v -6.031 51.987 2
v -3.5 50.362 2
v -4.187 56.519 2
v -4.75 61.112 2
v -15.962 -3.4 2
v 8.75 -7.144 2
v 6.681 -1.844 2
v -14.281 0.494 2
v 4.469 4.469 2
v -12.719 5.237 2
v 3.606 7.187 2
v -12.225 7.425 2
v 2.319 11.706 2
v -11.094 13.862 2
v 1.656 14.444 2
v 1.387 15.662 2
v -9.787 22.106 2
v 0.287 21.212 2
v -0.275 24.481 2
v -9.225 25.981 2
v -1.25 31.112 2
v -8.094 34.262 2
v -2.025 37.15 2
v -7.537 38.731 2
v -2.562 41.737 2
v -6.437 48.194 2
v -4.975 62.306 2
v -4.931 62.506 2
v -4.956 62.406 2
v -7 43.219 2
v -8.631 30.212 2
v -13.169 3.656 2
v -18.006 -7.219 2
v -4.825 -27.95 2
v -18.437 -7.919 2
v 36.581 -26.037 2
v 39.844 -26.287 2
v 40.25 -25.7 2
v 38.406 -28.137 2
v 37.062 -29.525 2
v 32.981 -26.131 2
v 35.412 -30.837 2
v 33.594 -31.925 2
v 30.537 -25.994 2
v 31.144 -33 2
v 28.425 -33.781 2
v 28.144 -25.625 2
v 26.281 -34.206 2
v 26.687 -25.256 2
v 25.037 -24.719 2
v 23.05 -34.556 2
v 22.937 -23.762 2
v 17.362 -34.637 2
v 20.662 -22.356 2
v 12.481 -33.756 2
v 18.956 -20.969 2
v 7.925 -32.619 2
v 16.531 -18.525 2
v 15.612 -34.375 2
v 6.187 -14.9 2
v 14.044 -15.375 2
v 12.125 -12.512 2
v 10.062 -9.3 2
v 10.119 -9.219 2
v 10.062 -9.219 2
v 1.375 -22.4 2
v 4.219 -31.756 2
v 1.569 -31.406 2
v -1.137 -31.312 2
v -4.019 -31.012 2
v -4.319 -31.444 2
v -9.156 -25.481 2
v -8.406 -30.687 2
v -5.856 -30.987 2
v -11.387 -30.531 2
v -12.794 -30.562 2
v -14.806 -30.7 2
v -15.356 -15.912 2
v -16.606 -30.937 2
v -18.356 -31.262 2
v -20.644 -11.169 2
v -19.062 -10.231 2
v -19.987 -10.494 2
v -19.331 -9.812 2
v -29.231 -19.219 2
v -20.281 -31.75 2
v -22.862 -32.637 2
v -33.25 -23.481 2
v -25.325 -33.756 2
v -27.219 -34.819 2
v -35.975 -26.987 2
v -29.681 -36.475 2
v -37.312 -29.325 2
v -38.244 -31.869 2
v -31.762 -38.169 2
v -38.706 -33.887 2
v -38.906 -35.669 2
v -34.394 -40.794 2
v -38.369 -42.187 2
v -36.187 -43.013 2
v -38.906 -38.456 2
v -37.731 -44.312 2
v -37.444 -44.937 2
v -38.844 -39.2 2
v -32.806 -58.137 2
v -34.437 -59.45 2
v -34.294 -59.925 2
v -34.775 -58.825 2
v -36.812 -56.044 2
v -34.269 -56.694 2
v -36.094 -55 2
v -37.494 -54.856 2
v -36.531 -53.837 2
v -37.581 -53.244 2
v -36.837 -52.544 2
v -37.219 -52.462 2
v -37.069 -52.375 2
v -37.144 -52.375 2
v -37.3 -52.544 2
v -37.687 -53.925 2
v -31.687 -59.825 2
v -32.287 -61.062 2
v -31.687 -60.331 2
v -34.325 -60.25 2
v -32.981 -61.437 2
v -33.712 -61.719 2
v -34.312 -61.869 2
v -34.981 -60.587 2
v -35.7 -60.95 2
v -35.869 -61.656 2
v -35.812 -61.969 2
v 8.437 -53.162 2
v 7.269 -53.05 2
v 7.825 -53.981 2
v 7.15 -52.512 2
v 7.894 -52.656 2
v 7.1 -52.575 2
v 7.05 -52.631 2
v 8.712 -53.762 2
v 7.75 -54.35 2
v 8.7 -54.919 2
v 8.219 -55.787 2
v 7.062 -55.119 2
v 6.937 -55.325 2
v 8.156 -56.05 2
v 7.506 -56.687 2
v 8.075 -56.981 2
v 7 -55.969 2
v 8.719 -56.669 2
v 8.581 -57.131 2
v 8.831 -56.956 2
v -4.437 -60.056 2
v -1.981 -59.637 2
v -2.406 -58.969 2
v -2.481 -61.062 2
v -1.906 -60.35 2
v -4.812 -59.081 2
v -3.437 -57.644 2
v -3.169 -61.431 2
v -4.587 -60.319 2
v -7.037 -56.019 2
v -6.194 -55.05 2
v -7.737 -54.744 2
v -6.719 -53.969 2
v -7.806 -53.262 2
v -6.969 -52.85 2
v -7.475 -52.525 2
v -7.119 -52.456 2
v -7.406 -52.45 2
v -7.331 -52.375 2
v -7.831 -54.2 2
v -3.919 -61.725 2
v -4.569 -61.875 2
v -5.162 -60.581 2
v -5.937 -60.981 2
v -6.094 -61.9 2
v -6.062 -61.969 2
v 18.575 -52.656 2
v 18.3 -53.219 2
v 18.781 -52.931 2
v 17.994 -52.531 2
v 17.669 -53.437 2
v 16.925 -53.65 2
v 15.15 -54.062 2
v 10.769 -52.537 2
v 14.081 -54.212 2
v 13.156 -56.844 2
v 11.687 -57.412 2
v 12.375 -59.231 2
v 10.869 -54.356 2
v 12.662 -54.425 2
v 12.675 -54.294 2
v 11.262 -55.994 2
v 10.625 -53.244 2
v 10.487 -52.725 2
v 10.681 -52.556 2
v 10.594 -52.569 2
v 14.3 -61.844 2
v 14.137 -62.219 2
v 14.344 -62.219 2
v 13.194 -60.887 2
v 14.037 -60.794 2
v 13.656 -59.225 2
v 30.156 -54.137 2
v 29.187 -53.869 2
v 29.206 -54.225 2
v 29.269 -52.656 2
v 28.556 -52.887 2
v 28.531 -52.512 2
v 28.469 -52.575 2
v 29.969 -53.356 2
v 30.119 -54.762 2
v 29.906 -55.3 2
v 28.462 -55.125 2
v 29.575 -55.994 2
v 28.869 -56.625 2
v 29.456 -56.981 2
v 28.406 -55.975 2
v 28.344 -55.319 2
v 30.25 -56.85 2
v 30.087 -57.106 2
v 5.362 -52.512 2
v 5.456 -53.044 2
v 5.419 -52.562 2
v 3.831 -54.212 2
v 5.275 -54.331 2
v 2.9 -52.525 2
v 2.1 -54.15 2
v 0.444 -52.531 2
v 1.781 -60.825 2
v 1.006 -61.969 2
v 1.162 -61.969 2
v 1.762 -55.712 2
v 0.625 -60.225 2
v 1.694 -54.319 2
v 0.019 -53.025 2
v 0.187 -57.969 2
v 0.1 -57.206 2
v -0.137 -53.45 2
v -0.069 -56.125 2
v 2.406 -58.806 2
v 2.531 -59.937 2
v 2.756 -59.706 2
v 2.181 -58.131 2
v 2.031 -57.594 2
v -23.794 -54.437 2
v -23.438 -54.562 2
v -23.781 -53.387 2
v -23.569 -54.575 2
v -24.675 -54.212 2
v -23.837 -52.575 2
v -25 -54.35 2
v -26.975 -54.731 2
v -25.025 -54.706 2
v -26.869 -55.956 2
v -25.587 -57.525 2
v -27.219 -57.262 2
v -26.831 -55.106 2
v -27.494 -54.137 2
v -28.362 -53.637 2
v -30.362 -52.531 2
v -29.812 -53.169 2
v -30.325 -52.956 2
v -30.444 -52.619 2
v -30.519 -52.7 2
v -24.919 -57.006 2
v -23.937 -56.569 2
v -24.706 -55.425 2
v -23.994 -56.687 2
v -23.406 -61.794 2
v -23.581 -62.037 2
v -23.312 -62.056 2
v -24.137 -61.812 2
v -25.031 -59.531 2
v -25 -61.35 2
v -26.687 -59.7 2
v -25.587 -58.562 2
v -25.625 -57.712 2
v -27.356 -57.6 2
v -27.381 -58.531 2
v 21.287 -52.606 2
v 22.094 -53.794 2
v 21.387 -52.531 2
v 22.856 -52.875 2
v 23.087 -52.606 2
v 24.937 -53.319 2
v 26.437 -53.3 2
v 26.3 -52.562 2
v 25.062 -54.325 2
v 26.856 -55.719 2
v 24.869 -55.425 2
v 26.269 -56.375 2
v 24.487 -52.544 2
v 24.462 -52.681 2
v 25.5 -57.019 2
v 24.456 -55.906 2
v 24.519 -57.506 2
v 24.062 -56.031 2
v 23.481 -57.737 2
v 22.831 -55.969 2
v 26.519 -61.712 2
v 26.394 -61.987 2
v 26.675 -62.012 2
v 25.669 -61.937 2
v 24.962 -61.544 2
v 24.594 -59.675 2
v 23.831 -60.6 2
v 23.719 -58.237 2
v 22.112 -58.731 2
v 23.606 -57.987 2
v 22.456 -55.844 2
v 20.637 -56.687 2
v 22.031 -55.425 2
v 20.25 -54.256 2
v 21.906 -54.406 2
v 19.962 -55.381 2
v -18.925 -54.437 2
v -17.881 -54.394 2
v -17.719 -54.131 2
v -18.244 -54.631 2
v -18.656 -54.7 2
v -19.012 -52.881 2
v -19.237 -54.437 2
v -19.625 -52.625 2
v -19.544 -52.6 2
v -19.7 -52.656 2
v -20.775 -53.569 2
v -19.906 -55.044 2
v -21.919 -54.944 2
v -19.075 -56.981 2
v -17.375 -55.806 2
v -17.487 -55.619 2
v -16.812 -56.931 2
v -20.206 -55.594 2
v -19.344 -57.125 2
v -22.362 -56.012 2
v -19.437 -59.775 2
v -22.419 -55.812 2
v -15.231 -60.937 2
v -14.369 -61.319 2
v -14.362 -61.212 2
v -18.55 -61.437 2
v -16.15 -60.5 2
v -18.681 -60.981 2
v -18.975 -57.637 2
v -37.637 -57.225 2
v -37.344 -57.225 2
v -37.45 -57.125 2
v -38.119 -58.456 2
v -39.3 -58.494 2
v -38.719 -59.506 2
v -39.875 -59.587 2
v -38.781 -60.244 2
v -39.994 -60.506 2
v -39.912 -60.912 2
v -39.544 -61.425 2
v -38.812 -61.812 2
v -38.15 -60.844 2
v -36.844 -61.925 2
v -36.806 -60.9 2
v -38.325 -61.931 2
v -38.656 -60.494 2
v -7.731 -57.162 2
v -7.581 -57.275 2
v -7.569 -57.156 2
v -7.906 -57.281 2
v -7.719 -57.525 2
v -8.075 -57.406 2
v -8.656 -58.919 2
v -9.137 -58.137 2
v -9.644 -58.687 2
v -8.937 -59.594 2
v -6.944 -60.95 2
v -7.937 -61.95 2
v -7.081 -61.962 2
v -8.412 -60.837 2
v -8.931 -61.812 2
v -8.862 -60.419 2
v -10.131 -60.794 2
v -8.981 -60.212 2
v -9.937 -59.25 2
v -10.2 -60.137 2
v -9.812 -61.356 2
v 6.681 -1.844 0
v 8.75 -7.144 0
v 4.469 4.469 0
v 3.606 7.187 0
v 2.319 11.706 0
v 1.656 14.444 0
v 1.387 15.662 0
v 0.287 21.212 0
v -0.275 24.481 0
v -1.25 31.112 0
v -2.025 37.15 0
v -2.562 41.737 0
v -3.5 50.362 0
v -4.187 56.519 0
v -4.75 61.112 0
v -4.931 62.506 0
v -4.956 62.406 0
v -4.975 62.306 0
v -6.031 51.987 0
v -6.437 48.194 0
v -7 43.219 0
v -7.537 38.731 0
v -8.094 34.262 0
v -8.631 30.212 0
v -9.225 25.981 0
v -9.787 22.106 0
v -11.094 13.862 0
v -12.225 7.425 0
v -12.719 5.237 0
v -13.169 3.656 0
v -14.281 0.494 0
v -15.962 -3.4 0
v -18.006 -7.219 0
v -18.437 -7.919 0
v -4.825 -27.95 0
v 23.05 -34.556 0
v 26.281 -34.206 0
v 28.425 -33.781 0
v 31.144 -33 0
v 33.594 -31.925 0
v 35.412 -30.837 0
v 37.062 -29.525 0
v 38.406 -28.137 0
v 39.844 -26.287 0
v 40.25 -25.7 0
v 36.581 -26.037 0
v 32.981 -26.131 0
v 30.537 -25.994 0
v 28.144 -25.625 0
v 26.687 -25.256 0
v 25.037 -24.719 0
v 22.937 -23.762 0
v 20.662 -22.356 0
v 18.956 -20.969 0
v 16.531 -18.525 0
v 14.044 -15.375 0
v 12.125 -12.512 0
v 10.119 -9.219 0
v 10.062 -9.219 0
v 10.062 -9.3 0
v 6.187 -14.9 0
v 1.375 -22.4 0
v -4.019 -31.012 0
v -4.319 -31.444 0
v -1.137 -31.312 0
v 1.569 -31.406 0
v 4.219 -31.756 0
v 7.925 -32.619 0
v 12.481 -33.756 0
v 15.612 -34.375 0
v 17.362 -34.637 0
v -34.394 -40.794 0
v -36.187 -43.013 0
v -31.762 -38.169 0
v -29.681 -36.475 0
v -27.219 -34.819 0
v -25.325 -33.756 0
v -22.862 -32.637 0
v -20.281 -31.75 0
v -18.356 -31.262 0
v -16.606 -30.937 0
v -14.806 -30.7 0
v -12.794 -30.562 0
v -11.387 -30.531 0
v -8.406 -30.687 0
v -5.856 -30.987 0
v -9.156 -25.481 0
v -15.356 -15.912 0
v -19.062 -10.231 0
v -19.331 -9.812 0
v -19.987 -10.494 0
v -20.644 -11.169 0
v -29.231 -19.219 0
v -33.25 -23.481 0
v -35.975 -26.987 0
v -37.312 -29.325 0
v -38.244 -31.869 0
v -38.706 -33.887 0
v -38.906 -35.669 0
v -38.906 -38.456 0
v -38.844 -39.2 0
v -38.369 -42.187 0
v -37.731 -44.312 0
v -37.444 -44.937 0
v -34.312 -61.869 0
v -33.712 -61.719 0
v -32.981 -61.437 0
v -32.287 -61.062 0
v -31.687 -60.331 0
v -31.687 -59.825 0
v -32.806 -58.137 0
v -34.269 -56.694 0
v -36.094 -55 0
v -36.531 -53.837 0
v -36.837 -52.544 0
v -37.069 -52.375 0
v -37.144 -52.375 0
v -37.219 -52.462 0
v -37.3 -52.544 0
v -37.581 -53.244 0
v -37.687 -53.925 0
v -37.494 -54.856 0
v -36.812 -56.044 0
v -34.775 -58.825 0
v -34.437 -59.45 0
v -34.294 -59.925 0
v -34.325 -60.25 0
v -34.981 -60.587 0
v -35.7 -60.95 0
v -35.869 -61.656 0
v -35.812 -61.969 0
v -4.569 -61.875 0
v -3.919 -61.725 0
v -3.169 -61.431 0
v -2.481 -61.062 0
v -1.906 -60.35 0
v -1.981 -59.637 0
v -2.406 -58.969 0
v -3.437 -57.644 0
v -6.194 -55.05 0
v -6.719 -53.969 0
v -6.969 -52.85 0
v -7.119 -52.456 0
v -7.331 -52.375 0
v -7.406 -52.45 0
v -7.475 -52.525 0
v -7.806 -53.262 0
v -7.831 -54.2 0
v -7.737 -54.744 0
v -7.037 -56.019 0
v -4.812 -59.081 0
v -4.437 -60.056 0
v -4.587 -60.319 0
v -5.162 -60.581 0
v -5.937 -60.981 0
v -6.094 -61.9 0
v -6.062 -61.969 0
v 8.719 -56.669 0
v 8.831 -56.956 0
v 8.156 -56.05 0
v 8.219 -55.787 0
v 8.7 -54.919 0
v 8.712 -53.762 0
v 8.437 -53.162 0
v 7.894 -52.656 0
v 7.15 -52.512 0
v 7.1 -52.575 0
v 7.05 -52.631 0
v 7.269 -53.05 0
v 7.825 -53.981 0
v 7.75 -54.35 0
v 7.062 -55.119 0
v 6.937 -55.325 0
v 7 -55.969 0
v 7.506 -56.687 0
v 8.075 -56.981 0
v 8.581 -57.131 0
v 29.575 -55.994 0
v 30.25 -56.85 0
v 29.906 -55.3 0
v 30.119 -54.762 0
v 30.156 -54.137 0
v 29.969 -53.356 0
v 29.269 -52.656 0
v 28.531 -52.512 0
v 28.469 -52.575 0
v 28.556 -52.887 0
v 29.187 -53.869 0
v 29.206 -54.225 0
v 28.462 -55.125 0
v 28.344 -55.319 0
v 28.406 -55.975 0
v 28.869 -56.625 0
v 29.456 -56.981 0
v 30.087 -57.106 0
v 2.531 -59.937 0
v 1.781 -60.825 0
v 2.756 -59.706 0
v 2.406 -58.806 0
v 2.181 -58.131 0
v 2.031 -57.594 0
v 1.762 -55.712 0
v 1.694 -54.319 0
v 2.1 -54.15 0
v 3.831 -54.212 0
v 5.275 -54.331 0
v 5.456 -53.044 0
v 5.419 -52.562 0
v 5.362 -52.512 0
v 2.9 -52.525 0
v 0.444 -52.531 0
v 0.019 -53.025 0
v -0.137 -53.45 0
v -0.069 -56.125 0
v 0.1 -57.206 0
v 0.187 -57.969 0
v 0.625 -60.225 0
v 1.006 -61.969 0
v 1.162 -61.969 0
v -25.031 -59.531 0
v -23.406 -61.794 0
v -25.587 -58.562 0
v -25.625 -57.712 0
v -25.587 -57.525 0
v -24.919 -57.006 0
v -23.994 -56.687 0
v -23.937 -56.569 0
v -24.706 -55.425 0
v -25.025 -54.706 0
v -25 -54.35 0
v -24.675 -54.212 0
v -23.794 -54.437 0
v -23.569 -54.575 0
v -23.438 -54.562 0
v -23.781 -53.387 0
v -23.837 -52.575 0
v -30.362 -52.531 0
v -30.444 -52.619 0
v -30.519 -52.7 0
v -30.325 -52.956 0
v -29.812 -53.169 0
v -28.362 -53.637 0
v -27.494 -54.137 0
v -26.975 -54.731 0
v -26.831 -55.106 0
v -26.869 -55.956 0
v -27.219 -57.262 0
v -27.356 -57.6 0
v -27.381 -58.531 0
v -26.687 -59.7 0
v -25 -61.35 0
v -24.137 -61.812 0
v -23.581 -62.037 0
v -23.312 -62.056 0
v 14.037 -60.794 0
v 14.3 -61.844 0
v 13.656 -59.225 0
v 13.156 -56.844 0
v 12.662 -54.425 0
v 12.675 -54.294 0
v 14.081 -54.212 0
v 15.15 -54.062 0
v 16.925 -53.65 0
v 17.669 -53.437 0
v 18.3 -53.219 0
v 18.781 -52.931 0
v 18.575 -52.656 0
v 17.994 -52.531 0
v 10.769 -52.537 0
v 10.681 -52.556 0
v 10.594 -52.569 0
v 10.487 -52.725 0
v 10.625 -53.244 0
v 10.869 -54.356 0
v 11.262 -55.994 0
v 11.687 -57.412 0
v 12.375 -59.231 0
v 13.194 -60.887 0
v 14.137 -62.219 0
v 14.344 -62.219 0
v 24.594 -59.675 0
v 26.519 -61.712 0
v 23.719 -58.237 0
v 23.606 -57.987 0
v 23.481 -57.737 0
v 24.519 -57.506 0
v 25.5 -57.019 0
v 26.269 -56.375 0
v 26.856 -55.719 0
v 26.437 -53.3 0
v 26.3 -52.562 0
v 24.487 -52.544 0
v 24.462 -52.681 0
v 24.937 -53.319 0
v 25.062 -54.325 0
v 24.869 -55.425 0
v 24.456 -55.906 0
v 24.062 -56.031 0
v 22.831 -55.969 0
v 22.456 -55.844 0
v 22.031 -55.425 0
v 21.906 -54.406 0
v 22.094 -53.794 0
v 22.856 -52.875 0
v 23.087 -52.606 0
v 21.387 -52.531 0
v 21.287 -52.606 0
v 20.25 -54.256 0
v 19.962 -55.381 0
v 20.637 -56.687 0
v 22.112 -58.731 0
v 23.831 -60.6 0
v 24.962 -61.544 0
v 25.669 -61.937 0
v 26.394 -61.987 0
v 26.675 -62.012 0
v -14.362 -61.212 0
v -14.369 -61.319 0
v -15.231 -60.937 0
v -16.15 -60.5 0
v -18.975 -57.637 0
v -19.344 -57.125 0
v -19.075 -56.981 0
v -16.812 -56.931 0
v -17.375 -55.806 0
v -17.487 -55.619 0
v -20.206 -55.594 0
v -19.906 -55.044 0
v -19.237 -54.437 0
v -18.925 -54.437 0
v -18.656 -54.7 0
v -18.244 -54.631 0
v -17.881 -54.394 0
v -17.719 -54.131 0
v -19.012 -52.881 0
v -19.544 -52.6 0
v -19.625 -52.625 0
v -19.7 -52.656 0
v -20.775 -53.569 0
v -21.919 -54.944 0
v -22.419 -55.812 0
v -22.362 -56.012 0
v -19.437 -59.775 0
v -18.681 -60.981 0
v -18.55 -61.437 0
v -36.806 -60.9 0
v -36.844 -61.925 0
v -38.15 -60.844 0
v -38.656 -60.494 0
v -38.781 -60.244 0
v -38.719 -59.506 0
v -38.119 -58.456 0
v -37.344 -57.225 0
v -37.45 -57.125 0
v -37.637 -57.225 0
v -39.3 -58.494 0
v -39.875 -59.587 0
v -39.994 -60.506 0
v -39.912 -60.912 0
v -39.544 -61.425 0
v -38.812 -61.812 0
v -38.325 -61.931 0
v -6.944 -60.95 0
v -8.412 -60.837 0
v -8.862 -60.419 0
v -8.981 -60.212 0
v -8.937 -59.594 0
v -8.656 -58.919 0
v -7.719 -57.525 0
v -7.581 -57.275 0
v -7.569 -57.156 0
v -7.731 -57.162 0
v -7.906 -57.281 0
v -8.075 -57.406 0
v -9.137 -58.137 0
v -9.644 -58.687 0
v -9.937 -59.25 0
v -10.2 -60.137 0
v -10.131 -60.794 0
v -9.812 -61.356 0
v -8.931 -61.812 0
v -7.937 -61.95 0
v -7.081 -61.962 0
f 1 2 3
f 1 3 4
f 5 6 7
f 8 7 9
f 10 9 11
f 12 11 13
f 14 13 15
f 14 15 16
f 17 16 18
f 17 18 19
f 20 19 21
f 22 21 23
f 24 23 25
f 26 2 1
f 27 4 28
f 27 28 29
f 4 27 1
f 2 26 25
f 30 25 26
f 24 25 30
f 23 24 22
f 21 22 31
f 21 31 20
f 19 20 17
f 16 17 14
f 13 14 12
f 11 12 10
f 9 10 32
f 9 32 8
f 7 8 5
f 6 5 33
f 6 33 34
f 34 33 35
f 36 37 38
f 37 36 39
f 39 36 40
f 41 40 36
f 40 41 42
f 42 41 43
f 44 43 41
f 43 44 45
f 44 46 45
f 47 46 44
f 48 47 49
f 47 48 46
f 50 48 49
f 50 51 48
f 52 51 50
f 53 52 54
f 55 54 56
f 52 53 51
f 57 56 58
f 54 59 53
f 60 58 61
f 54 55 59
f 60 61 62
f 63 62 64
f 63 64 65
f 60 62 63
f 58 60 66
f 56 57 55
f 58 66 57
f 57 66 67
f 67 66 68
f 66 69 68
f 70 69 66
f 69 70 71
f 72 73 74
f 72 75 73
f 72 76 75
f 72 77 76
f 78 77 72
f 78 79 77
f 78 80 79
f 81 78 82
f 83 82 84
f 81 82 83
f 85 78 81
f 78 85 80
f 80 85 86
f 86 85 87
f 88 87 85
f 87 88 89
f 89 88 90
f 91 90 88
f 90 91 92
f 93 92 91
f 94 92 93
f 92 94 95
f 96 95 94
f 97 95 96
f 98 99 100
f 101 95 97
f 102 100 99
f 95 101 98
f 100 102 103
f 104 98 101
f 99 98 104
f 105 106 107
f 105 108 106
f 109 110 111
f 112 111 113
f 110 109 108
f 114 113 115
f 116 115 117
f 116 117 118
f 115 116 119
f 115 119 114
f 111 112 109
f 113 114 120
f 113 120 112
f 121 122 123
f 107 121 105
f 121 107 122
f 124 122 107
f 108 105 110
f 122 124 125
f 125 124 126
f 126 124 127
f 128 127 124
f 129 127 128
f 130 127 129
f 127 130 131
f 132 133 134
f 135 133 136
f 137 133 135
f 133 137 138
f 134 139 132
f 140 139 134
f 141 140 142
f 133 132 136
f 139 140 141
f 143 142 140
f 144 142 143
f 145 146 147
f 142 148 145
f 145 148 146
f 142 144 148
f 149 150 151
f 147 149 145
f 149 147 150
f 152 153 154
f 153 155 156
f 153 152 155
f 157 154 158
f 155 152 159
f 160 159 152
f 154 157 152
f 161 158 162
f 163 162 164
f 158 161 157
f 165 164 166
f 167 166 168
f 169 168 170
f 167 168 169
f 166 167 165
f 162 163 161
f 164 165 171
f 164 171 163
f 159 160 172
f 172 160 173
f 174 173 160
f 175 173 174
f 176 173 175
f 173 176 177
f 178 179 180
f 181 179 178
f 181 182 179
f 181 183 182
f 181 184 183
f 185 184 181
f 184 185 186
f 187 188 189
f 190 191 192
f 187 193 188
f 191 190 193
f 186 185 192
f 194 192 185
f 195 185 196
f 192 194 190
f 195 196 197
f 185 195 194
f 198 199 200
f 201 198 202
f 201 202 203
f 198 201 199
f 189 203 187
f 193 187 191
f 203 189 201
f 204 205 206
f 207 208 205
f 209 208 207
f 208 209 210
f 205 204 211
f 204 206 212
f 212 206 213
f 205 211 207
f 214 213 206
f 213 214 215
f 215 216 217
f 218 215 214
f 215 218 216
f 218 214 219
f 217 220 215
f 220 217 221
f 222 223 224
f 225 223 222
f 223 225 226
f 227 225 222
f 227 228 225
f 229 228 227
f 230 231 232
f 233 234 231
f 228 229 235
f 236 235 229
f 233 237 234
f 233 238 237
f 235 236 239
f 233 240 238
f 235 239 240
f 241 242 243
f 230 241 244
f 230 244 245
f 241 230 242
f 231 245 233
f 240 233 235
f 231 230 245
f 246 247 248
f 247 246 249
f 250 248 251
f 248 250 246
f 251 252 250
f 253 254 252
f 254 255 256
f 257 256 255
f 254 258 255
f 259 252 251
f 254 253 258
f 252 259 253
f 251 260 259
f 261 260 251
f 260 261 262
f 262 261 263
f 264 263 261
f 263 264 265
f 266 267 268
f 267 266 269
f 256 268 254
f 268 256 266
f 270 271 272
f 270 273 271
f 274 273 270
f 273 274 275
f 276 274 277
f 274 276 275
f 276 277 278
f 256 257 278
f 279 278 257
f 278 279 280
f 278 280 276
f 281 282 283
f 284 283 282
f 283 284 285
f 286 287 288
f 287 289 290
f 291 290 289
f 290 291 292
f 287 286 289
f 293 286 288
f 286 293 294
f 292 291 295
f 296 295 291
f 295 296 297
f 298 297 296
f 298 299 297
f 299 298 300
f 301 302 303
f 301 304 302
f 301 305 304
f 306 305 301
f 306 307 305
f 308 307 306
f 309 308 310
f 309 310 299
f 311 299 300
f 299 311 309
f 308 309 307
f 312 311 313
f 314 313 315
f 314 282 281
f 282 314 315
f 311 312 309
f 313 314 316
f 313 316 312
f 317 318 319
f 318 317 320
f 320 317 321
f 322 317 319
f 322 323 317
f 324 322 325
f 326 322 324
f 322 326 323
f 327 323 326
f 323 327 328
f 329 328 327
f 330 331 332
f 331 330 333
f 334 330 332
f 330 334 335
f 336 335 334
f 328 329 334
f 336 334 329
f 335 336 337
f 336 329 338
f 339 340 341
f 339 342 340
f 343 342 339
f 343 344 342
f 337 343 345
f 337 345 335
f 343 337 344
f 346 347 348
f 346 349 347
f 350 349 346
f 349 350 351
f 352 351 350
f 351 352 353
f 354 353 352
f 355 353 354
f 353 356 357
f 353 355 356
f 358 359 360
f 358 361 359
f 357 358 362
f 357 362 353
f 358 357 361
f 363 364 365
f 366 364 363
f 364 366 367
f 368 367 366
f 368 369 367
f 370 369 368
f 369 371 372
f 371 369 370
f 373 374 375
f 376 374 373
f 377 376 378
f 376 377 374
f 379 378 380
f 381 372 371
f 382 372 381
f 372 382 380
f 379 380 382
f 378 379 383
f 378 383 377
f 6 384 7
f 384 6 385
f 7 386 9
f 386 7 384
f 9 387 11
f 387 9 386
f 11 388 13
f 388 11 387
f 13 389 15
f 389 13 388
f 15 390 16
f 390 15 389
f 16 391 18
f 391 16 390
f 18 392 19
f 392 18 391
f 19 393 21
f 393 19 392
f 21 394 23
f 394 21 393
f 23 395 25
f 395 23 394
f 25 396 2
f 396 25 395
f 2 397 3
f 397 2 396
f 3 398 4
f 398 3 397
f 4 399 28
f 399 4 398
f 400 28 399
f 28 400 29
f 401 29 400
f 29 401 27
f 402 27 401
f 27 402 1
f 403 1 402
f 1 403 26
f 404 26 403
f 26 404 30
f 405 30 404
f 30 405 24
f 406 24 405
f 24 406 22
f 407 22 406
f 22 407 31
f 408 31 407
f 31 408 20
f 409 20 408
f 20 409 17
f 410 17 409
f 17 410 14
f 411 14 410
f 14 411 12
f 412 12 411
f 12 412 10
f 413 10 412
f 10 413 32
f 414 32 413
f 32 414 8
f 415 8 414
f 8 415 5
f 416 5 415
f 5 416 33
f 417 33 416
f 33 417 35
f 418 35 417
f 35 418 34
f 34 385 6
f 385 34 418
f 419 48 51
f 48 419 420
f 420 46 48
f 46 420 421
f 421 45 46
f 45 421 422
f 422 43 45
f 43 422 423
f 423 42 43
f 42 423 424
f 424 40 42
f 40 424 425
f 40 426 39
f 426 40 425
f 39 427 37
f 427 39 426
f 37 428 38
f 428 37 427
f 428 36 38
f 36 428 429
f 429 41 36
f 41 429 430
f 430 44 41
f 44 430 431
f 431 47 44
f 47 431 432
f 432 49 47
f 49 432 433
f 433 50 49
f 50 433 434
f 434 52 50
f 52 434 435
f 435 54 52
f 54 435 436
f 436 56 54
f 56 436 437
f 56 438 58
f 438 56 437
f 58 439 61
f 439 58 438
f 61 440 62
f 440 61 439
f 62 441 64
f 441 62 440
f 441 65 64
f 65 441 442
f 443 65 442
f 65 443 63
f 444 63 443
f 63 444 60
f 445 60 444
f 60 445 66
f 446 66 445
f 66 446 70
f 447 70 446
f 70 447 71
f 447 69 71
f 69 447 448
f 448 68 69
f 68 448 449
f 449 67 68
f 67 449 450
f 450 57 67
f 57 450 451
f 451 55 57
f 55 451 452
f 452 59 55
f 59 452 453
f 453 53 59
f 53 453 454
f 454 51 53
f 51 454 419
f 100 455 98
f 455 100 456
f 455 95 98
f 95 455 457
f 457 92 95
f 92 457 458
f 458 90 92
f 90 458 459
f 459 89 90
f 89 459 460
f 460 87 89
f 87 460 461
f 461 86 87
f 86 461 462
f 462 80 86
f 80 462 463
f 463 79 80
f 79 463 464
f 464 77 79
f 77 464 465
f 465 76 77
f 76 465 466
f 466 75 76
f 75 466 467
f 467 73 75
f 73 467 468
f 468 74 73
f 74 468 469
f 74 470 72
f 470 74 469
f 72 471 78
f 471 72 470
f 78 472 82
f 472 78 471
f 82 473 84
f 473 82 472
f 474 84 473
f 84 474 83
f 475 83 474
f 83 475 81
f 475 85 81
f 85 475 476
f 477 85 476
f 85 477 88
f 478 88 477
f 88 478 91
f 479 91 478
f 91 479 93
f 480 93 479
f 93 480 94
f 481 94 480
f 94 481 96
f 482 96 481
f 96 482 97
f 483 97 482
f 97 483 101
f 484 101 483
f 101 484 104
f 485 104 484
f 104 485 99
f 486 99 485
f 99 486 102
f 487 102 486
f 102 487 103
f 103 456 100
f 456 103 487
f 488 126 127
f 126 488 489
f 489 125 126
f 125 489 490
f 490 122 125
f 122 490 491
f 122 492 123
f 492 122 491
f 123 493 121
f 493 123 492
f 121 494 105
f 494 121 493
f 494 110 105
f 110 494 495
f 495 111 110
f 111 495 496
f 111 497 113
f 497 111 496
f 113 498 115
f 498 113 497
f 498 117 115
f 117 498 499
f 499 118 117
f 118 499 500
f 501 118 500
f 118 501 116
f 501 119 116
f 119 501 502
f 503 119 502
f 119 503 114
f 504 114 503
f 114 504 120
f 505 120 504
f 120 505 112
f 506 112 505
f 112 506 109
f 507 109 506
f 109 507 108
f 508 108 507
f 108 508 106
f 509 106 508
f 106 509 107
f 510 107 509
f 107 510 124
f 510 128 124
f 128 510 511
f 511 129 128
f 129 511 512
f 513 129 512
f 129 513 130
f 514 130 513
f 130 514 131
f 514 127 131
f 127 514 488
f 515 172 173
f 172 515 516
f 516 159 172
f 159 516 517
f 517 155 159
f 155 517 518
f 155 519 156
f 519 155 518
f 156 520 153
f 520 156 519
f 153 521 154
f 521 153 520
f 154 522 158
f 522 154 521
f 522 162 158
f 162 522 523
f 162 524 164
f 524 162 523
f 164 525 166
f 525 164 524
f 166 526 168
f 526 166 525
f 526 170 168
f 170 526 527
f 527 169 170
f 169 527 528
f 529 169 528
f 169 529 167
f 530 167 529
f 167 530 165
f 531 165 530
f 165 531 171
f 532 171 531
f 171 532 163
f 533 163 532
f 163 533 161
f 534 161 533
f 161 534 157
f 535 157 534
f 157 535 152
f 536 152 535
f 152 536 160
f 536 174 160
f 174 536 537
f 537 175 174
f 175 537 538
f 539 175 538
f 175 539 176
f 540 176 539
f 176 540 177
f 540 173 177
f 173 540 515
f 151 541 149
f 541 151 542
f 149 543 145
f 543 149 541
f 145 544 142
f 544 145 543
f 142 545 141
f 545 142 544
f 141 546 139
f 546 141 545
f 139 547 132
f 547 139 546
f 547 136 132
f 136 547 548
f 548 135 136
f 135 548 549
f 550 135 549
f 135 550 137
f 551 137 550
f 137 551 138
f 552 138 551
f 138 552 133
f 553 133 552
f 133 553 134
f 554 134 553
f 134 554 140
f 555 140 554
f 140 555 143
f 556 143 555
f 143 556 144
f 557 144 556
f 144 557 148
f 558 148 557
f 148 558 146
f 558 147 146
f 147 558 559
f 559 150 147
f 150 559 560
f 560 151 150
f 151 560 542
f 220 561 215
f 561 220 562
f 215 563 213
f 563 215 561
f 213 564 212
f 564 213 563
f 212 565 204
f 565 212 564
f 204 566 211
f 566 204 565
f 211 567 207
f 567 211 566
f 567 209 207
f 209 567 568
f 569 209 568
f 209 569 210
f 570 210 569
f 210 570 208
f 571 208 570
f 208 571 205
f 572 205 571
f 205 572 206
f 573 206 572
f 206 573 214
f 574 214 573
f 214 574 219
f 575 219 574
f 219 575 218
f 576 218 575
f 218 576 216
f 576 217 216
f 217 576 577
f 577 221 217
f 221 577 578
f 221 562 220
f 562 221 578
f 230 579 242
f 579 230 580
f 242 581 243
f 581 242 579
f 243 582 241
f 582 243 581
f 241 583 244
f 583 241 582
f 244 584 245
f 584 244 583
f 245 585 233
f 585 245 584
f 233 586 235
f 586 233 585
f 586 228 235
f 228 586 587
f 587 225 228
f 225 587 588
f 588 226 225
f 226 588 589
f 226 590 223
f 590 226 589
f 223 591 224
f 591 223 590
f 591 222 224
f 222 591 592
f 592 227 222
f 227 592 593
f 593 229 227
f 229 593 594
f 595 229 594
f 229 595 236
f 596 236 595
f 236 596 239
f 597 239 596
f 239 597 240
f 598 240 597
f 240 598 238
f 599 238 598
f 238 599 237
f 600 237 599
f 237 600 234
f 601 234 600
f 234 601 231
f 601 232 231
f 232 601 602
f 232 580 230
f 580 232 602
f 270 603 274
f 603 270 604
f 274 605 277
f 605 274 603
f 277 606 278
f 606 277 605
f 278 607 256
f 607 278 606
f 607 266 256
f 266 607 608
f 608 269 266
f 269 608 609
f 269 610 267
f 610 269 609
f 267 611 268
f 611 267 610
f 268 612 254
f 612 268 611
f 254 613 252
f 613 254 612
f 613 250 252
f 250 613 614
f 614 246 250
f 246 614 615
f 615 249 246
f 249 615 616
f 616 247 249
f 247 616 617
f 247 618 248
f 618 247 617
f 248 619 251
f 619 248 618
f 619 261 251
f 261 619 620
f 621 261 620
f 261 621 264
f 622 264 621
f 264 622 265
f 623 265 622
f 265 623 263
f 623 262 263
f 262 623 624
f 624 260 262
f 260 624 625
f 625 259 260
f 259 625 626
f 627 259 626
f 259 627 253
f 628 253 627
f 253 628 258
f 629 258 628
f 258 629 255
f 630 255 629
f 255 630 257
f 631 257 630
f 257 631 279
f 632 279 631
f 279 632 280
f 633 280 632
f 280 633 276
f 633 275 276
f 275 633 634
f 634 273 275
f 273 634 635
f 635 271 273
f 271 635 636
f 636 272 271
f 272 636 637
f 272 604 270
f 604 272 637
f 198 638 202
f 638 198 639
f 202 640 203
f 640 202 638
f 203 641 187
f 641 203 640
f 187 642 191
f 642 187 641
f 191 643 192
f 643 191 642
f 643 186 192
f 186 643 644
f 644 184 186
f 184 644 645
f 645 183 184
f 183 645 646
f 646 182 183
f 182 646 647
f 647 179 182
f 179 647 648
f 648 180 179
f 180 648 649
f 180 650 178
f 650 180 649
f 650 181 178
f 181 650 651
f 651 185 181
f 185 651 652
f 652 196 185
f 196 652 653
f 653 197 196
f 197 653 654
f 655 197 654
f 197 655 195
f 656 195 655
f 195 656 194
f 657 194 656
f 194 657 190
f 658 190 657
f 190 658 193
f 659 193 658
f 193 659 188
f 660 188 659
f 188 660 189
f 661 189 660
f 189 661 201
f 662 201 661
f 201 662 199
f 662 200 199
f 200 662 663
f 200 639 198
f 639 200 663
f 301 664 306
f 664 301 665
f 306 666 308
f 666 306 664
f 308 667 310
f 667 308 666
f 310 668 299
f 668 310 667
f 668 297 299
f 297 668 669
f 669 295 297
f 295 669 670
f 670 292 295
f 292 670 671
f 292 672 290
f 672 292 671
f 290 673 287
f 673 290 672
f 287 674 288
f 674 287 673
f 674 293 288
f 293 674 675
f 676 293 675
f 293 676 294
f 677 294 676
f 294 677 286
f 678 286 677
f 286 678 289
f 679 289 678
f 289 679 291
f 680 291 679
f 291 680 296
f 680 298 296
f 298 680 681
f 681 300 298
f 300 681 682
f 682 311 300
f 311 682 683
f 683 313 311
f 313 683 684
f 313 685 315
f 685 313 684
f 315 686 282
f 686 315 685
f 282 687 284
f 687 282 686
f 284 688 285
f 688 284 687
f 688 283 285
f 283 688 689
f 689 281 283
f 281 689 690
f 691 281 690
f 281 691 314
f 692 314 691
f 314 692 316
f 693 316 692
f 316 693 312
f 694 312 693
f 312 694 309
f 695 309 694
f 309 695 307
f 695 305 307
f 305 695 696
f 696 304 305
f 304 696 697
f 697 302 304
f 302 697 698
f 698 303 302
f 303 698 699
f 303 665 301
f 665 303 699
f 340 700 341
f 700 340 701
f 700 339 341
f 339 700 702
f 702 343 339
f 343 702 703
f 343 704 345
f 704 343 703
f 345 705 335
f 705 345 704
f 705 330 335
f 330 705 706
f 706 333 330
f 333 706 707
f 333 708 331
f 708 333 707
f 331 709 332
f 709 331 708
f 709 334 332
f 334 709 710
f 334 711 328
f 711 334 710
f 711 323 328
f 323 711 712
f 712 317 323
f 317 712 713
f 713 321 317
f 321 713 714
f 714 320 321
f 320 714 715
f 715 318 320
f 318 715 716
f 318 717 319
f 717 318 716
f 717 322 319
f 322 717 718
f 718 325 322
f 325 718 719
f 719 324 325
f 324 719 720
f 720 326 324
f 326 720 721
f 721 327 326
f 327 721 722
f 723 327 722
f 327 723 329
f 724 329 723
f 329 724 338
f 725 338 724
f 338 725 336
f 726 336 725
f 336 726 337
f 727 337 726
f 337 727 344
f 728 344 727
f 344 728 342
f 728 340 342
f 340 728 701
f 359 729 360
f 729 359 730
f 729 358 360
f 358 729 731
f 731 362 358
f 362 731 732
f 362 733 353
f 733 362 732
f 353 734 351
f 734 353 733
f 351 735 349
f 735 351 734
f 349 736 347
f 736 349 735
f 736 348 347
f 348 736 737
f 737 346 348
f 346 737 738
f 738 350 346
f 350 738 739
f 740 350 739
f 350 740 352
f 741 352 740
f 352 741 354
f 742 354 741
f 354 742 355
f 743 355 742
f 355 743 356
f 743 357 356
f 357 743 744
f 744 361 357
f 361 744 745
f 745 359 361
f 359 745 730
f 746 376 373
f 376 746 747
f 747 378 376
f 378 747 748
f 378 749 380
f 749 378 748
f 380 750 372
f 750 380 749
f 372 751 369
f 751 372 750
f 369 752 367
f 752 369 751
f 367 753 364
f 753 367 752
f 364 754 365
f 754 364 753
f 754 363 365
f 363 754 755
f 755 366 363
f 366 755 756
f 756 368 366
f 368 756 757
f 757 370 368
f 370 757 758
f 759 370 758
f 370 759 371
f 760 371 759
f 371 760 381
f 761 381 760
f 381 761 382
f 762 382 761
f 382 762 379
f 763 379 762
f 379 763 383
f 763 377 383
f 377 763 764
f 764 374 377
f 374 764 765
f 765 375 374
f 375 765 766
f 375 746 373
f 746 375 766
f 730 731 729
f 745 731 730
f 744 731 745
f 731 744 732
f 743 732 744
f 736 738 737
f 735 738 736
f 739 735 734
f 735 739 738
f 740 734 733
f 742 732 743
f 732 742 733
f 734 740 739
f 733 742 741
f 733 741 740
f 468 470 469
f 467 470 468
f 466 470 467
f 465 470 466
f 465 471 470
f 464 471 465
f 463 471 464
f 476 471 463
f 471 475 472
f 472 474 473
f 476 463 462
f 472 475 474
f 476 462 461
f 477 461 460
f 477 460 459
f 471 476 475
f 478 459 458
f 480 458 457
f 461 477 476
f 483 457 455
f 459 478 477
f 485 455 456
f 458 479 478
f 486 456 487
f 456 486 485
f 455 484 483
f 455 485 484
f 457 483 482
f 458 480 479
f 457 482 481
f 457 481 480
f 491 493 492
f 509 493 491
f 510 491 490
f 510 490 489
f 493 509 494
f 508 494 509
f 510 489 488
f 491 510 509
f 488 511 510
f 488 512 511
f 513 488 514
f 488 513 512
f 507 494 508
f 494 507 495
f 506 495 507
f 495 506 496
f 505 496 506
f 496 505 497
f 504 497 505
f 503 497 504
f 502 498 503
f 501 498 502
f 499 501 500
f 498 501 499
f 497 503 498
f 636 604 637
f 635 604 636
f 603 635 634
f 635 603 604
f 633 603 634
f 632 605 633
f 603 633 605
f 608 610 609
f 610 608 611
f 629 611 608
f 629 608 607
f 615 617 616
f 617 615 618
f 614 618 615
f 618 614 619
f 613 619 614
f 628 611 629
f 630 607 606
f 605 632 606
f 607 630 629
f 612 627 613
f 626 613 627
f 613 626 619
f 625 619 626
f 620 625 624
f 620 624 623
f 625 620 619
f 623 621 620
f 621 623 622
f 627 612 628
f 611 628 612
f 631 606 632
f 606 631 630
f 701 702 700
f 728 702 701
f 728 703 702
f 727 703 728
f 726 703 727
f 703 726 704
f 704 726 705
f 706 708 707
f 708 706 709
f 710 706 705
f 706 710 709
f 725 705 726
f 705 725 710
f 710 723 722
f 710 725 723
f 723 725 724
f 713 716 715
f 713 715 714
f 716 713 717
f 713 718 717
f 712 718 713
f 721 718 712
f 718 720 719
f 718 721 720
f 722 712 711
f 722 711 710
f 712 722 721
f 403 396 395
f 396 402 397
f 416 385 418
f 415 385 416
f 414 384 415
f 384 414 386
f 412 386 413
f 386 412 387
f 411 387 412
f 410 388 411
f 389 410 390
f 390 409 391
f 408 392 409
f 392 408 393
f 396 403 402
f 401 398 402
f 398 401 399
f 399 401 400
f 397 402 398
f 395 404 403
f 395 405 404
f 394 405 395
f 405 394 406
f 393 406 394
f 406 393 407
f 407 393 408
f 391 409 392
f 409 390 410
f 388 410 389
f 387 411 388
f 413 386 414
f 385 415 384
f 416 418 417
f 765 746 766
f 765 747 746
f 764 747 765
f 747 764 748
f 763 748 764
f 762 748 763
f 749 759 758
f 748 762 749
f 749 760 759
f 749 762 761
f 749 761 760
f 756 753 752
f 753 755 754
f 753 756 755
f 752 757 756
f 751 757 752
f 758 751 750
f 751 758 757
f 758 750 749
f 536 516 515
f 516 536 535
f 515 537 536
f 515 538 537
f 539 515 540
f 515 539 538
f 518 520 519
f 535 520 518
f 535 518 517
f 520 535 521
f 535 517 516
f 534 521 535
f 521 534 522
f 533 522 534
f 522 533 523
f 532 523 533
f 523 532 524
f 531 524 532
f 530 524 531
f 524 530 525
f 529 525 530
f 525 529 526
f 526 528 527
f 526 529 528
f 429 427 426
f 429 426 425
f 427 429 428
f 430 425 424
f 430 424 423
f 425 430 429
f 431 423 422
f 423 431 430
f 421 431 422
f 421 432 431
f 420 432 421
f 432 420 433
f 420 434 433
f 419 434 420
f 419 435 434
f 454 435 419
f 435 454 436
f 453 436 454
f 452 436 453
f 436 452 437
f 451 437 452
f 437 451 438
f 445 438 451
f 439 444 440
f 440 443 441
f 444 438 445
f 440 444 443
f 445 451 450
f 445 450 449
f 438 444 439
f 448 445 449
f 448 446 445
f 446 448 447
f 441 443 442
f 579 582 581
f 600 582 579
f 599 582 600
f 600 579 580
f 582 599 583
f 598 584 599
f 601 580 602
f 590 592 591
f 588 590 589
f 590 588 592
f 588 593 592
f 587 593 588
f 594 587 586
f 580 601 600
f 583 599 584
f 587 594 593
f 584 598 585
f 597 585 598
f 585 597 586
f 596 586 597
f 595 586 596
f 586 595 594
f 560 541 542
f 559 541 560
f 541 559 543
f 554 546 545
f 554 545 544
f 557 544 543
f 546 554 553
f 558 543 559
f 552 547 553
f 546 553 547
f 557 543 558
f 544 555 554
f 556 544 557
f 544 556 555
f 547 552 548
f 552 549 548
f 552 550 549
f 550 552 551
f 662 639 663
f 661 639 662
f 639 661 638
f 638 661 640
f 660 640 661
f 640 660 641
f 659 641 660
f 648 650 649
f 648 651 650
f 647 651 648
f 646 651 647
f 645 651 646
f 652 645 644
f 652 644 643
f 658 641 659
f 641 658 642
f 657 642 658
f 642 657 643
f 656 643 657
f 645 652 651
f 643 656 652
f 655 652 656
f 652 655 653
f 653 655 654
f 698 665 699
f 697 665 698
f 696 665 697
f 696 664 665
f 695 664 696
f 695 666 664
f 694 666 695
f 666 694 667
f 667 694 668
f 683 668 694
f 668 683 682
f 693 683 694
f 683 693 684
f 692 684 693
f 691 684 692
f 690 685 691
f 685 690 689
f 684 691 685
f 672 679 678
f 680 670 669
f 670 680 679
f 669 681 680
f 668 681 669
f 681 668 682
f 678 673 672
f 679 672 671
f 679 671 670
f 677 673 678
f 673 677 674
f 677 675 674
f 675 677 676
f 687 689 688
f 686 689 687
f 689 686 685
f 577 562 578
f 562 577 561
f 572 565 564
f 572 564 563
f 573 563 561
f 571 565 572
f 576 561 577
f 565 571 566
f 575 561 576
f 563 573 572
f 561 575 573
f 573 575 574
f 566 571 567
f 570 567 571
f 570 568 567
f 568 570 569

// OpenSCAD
module 5a22b75c77c72e35524bb3366eb4b297_1()
{
 /* Generated by trace2scad version 20150415
    http://aggregate.org/MAKE/TRACE2SCAD/
    Optimized model has 387/4796 original points
 */
 color([0.48, 0.48, 0.48])
 assign(minx=0) /* polygon minx=39 */
 assign(miny=0) /* polygon miny=45 */
 assign(maxx=12880) /* polygon maxx=12880 */
 assign(maxy=20000) /* polygon maxy=20001 */
 assign(dx=maxx-minx)
 assign(dy=maxy-miny)
 assign(maxd=((dx>dy)?dx:dy))
 scale([1/maxd, 1/maxd, 1])
 translate([-minx-dx/2, -miny-dy/2, 0])
 linear_extrude(height=1, convexity=387)
 union() {
  union() {
   polygon([[5647,19985],[5644,19969],[5475,18318],[5410,17711],[5320,16915],[5234,16197],[5145,15482],[5059,14834],[4964,14157],[4874,13537],[4665,12218],[4484,11188],[4405,10838],[4333,10585],[4155,10079],[3886,9456],[3559,8845],[3490,8733],[5668,5528],[7840,8857],[7509,9705],[7155,10715],[7017,11150],[6811,11873],[6705,12311],[6662,12506],[6486,13394],[6396,13917],[6240,14978],[6116,15944],[6030,16678],[5880,18058],[5770,19043],[5680,19778],[5651,20001]], convexity=6);
   polygon([[8050,8518],[8050,8512],[7430,7616],[6660,6416],[5797,5038],[5749,4969],[6258,4990],[6691,4975],[7115,4919],[7708,4781],[8437,4599],[8938,4500],[9218,4458],[10128,4471],[10645,4527],[10988,4595],[11423,4720],[11815,4892],[12106,5066],[12370,5276],[12585,5498],[12815,5794],[12880,5888],[12293,5834],[11717,5819],[11326,5841],[10943,5900],[10710,5959],[10446,6045],[10110,6198],[9746,6423],[9473,6645],[9085,7036],[8687,7540],[8380,7998],[8059,8525],[8050,8525]], convexity=9);
   polygon([[3242,8321],[3137,8213],[1763,6925],[1120,6243],[684,5682],[470,5308],[321,4901],[247,4578],[215,4293],[215,3847],[225,3728],[301,3250],[403,2910],[449,2810],[650,3118],[937,3473],[1358,3893],[1691,4164],[2085,4429],[2388,4599],[2782,4778],[3195,4920],[3503,4998],[3783,5050],[4071,5088],[4393,5110],[4618,5115],[5095,5090],[5503,5042],[4975,5923],[3983,7454],[3390,8363],[3347,8430]], convexity=7);
   polygon([[485,1606],[472,1593],[427,1481],[410,1372],[441,1223],[550,1033],[876,588],[930,488],[953,412],[948,360],[843,306],[728,248],[701,135],[710,85],[950,101],[1046,125],[1163,170],[1274,230],[1370,347],[1370,428],[1191,698],[957,929],[665,1200],[595,1386],[546,1593],[509,1620],[497,1620]], convexity=8);
   polygon([[5255,1608],[5244,1596],[5191,1478],[5187,1328],[5202,1241],[5314,1037],[5670,547],[5730,391],[5706,349],[5614,307],[5490,243],[5465,96],[5470,85],[5709,100],[5813,124],[5933,171],[6043,230],[6135,344],[6123,458],[6055,565],[5890,777],[5449,1192],[5365,1365],[5325,1544],[5301,1607],[5267,1620]], convexity=8);
   polygon([[6904,1596],[6511,1595],[6443,1516],[6418,1448],[6429,1020],[6456,847],[6470,725],[6540,364],[6601,85],[6626,85],[6725,268],[6845,410],[6881,447],[6825,591],[6789,699],[6765,785],[6722,1086],[6711,1309],[6776,1336],[7053,1326],[7284,1307],[7313,1513],[7307,1590],[7298,1598]], convexity=10);
   polygon([[7576,1588],[7568,1579],[7603,1512],[7692,1363],[7680,1304],[7570,1181],[7550,1148],[7560,1045],[7641,930],[7732,883],[7813,859],[7853,887],[7835,933],[7745,1032],[7755,1074],[7832,1213],[7834,1398],[7790,1494],[7703,1575],[7584,1598]], convexity=10);
   polygon([[11000,1593],[10995,1588],[11009,1538],[11110,1381],[11113,1324],[10994,1180],[10975,1149],[10985,1044],[11059,940],[11153,883],[11254,863],[11280,904],[11172,1041],[11225,1152],[11259,1238],[11265,1338],[11235,1463],[11123,1575],[11005,1598]], convexity=10);
   polygon([[1569,1581],[1557,1568],[1588,1527],[1670,1493],[1902,1418],[2041,1338],[2124,1243],[2147,1183],[2141,1047],[2085,838],[2063,784],[2059,635],[2170,448],[2440,184],[2578,110],[2667,74],[2710,71],[2695,113],[2435,475],[2346,630],[2340,766],[2346,796],[2453,879],[2601,930],[2610,949],[2487,1132],[2436,1247],[2440,1304],[2492,1326],[2633,1290],[2669,1268],[2690,1270],[2635,1458],[2626,1588],[1582,1595]], convexity=13);
   polygon([[8149,1591],[8135,1589],[8118,1564],[8140,1481],[8179,1303],[8242,1041],[8310,814],[8420,523],[8551,258],[8702,45],[8735,45],[8728,105],[8686,273],[8625,524],[8545,905],[8466,1292],[8468,1313],[8693,1326],[8864,1350],[9148,1416],[9267,1450],[9368,1485],[9445,1531],[9412,1575],[9319,1595],[8163,1594]], convexity=9);
   polygon([[9854,1589],[9846,1583],[9680,1319],[9634,1139],[9742,930],[9978,603],[10253,304],[10434,153],[10547,90],[10663,82],[10708,78],[10683,126],[10375,452],[10235,682],[10217,722],[10197,762],[10363,799],[10520,877],[10643,980],[10737,1085],[10670,1472],[10648,1590],[10358,1593],[10354,1571],[10430,1469],[10450,1308],[10419,1132],[10353,1055],[10290,1035],[10093,1045],[10033,1065],[9965,1132],[9945,1295],[9975,1393],[10097,1540],[10134,1583],[9862,1595]], convexity=13);
   polygon([[3300,1580],[3288,1575],[3116,1429],[2933,1209],[2853,1070],[2862,1038],[3330,436],[3451,243],[3472,170],[4141,189],[4142,206],[4003,250],[3856,320],[3404,778],[3345,860],[3388,883],[3750,891],[3660,1071],[3642,1101],[3207,1105],[3255,1193],[3362,1290],[3412,1290],[3455,1248],[3521,1259],[3579,1297],[3605,1339],[3398,1539],[3313,1584]], convexity=12);
   polygon([[433,852],[418,844],[152,641],[60,466],[41,319],[54,254],[113,172],[230,110],[308,91],[545,92],[551,256],[336,265],[255,321],[235,361],[245,479],[341,647],[465,844],[448,860]], convexity=8);
   polygon([[5175,835],[5148,815],[4978,698],[4897,610],[4850,520],[4808,378],[4819,273],[4870,183],[5011,110],[5170,88],[5307,86],[5329,248],[5094,266],[5022,333],[5003,366],[5010,465],[5055,573],[5205,796],[5227,836],[5229,855],[5203,854]], convexity=8);
  }
 }
}

module 5a22b75c77c72e35524bb3366eb4b297()
{
 /* all layers combined, scaled to within a 1mm cube */
 scale([1, 1, 1/1])
 difference() {
  union() {
   scale([1,1,2]) translate([0,0,-0.5]) 5a22b75c77c72e35524bb3366eb4b297_1();
  }
  translate([0,0,-2]) cube([2,2,4],center=true);
 }
}

scale([125, 125, 2]) {
	5a22b75c77c72e35524bb3366eb4b297();
}
